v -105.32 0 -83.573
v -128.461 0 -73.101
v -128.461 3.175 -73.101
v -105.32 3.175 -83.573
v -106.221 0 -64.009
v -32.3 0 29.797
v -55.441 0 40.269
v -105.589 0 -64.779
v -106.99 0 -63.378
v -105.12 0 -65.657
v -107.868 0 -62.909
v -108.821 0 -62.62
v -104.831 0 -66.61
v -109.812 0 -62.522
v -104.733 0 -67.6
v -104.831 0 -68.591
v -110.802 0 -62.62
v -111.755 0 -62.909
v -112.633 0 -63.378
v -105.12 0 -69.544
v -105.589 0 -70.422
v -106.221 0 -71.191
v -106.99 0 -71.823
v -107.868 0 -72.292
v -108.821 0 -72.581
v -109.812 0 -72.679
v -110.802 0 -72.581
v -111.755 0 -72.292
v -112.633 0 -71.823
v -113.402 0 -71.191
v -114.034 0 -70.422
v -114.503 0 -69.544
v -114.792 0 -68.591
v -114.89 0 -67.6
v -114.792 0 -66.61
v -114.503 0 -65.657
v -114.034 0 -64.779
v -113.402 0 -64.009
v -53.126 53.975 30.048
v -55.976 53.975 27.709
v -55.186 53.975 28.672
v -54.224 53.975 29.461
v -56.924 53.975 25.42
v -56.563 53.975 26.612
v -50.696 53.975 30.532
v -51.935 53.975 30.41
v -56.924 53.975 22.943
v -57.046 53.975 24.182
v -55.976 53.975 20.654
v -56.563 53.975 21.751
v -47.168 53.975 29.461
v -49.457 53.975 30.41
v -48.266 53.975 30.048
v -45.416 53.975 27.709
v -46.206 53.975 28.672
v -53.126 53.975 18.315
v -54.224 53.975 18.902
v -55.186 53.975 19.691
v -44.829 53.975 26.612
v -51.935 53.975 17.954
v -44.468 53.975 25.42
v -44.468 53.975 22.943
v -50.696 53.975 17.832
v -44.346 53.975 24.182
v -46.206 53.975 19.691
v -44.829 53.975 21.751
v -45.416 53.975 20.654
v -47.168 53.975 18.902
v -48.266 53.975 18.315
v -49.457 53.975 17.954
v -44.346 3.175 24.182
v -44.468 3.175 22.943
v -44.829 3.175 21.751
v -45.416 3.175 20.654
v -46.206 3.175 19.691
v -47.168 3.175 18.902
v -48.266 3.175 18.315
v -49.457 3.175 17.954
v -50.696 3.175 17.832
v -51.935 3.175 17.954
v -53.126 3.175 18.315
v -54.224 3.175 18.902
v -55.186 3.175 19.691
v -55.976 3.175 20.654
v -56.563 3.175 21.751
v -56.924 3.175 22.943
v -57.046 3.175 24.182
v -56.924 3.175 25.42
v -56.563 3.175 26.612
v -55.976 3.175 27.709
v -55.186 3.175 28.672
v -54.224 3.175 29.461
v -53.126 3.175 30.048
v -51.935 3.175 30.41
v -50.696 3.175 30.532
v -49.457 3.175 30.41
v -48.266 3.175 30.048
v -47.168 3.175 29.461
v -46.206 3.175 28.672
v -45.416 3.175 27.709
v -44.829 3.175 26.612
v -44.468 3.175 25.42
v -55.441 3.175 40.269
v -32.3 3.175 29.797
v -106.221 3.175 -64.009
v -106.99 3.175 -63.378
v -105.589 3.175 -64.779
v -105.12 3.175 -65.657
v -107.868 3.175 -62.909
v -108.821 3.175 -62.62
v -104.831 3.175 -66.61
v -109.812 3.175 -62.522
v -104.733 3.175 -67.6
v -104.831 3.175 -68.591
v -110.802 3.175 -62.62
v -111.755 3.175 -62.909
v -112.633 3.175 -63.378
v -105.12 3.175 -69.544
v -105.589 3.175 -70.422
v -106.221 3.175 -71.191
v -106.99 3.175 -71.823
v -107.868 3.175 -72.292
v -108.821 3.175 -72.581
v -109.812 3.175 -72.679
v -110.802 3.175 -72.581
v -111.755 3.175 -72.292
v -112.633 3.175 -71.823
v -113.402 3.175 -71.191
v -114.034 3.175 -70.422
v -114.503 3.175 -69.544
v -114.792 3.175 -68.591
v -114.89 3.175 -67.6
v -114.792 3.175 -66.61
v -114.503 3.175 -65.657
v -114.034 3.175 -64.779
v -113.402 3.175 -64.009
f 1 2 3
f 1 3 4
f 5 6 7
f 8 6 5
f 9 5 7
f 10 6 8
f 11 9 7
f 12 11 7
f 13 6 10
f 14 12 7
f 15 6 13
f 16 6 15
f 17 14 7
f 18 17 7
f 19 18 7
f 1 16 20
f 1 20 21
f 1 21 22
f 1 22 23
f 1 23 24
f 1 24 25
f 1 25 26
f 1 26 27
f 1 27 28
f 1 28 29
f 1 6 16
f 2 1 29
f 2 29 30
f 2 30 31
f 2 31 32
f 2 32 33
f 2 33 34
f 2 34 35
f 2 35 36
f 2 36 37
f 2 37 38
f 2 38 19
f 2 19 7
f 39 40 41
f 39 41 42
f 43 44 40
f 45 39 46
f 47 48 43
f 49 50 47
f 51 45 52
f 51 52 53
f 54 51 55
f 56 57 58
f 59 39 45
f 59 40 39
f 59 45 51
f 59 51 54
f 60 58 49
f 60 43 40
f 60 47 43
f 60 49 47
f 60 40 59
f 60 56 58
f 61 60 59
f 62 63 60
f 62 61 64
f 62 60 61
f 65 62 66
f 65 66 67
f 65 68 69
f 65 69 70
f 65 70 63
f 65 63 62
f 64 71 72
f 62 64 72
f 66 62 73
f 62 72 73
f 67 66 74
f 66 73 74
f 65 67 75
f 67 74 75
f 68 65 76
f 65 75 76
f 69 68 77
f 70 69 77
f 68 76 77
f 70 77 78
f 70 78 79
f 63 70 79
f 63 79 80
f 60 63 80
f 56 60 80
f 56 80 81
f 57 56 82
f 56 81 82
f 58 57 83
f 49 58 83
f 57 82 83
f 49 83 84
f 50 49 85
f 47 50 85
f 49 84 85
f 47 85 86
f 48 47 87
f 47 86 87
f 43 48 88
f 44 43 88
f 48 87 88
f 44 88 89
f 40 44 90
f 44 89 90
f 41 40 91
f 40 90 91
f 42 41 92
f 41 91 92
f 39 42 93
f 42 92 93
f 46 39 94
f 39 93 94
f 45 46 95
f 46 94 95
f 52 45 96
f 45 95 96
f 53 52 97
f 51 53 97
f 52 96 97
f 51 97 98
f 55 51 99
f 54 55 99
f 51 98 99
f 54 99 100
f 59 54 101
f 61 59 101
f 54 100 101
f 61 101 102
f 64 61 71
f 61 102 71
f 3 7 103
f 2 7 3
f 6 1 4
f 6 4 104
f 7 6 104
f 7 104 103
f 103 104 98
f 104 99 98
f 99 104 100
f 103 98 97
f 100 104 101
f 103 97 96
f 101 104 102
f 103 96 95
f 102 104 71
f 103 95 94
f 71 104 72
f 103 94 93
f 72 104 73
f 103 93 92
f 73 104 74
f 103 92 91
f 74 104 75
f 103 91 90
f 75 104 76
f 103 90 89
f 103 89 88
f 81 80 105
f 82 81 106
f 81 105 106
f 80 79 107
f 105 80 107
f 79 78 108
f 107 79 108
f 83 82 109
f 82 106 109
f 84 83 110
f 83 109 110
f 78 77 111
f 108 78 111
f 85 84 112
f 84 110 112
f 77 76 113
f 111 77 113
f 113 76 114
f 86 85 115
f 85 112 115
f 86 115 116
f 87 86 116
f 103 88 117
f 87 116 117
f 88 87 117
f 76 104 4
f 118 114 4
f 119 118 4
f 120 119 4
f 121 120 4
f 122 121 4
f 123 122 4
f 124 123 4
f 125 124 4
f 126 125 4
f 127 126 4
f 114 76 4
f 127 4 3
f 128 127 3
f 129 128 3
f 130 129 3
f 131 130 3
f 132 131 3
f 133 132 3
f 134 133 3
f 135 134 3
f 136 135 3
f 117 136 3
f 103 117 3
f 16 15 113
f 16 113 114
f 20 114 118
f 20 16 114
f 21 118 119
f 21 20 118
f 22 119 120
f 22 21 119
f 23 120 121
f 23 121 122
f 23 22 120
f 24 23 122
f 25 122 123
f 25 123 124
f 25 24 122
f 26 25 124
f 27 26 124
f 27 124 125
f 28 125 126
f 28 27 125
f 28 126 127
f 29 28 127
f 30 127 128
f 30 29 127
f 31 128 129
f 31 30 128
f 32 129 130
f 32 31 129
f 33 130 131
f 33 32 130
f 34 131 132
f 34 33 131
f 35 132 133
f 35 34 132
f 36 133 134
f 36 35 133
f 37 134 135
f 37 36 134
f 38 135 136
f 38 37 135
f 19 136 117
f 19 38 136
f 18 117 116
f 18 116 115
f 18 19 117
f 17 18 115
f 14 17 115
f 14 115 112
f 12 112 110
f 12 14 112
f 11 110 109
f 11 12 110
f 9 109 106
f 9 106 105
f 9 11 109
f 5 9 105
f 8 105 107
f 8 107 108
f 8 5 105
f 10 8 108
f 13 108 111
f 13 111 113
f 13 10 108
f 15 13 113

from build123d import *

# Parameters (mm, degrees)
SKETCH1_R           = 5.078298903
BOSS_EXTRUDE1_DEPTH = 3.175
SKETCH2_R           = 6.35
BOSS_EXTRUDE2_DEPTH = 50.8


with BuildPart() as part:
    # Sketch1 → Boss-Extrude1 (new body)
    with BuildSketch(Plane(origin=(0, 0, 0), x_dir=(1, 0, 0), z_dir=(0, 1, 0))):
        Polygon((-55.44099562, -40.268516884), (-128.460753109, 73.100956593), (-105.319843222, 83.572742001), (-32.300085734, -29.796731476), align=None)
        with Locations((-109.811555345, 67.600325735)):
            Circle(SKETCH1_R, mode=Mode.SUBTRACT)
    extrude(amount=BOSS_EXTRUDE1_DEPTH)

    # Sketch2 → Boss-Extrude2 (add)
    with BuildSketch(Plane(origin=(0, 3.175, 0), x_dir=(1, 0, 0), z_dir=(0, 1, 0))):
        with Locations((-50.696094851, -24.181527026)):
            Circle(SKETCH2_R)
    extrude(amount=BOSS_EXTRUDE2_DEPTH)


solid = part.part
